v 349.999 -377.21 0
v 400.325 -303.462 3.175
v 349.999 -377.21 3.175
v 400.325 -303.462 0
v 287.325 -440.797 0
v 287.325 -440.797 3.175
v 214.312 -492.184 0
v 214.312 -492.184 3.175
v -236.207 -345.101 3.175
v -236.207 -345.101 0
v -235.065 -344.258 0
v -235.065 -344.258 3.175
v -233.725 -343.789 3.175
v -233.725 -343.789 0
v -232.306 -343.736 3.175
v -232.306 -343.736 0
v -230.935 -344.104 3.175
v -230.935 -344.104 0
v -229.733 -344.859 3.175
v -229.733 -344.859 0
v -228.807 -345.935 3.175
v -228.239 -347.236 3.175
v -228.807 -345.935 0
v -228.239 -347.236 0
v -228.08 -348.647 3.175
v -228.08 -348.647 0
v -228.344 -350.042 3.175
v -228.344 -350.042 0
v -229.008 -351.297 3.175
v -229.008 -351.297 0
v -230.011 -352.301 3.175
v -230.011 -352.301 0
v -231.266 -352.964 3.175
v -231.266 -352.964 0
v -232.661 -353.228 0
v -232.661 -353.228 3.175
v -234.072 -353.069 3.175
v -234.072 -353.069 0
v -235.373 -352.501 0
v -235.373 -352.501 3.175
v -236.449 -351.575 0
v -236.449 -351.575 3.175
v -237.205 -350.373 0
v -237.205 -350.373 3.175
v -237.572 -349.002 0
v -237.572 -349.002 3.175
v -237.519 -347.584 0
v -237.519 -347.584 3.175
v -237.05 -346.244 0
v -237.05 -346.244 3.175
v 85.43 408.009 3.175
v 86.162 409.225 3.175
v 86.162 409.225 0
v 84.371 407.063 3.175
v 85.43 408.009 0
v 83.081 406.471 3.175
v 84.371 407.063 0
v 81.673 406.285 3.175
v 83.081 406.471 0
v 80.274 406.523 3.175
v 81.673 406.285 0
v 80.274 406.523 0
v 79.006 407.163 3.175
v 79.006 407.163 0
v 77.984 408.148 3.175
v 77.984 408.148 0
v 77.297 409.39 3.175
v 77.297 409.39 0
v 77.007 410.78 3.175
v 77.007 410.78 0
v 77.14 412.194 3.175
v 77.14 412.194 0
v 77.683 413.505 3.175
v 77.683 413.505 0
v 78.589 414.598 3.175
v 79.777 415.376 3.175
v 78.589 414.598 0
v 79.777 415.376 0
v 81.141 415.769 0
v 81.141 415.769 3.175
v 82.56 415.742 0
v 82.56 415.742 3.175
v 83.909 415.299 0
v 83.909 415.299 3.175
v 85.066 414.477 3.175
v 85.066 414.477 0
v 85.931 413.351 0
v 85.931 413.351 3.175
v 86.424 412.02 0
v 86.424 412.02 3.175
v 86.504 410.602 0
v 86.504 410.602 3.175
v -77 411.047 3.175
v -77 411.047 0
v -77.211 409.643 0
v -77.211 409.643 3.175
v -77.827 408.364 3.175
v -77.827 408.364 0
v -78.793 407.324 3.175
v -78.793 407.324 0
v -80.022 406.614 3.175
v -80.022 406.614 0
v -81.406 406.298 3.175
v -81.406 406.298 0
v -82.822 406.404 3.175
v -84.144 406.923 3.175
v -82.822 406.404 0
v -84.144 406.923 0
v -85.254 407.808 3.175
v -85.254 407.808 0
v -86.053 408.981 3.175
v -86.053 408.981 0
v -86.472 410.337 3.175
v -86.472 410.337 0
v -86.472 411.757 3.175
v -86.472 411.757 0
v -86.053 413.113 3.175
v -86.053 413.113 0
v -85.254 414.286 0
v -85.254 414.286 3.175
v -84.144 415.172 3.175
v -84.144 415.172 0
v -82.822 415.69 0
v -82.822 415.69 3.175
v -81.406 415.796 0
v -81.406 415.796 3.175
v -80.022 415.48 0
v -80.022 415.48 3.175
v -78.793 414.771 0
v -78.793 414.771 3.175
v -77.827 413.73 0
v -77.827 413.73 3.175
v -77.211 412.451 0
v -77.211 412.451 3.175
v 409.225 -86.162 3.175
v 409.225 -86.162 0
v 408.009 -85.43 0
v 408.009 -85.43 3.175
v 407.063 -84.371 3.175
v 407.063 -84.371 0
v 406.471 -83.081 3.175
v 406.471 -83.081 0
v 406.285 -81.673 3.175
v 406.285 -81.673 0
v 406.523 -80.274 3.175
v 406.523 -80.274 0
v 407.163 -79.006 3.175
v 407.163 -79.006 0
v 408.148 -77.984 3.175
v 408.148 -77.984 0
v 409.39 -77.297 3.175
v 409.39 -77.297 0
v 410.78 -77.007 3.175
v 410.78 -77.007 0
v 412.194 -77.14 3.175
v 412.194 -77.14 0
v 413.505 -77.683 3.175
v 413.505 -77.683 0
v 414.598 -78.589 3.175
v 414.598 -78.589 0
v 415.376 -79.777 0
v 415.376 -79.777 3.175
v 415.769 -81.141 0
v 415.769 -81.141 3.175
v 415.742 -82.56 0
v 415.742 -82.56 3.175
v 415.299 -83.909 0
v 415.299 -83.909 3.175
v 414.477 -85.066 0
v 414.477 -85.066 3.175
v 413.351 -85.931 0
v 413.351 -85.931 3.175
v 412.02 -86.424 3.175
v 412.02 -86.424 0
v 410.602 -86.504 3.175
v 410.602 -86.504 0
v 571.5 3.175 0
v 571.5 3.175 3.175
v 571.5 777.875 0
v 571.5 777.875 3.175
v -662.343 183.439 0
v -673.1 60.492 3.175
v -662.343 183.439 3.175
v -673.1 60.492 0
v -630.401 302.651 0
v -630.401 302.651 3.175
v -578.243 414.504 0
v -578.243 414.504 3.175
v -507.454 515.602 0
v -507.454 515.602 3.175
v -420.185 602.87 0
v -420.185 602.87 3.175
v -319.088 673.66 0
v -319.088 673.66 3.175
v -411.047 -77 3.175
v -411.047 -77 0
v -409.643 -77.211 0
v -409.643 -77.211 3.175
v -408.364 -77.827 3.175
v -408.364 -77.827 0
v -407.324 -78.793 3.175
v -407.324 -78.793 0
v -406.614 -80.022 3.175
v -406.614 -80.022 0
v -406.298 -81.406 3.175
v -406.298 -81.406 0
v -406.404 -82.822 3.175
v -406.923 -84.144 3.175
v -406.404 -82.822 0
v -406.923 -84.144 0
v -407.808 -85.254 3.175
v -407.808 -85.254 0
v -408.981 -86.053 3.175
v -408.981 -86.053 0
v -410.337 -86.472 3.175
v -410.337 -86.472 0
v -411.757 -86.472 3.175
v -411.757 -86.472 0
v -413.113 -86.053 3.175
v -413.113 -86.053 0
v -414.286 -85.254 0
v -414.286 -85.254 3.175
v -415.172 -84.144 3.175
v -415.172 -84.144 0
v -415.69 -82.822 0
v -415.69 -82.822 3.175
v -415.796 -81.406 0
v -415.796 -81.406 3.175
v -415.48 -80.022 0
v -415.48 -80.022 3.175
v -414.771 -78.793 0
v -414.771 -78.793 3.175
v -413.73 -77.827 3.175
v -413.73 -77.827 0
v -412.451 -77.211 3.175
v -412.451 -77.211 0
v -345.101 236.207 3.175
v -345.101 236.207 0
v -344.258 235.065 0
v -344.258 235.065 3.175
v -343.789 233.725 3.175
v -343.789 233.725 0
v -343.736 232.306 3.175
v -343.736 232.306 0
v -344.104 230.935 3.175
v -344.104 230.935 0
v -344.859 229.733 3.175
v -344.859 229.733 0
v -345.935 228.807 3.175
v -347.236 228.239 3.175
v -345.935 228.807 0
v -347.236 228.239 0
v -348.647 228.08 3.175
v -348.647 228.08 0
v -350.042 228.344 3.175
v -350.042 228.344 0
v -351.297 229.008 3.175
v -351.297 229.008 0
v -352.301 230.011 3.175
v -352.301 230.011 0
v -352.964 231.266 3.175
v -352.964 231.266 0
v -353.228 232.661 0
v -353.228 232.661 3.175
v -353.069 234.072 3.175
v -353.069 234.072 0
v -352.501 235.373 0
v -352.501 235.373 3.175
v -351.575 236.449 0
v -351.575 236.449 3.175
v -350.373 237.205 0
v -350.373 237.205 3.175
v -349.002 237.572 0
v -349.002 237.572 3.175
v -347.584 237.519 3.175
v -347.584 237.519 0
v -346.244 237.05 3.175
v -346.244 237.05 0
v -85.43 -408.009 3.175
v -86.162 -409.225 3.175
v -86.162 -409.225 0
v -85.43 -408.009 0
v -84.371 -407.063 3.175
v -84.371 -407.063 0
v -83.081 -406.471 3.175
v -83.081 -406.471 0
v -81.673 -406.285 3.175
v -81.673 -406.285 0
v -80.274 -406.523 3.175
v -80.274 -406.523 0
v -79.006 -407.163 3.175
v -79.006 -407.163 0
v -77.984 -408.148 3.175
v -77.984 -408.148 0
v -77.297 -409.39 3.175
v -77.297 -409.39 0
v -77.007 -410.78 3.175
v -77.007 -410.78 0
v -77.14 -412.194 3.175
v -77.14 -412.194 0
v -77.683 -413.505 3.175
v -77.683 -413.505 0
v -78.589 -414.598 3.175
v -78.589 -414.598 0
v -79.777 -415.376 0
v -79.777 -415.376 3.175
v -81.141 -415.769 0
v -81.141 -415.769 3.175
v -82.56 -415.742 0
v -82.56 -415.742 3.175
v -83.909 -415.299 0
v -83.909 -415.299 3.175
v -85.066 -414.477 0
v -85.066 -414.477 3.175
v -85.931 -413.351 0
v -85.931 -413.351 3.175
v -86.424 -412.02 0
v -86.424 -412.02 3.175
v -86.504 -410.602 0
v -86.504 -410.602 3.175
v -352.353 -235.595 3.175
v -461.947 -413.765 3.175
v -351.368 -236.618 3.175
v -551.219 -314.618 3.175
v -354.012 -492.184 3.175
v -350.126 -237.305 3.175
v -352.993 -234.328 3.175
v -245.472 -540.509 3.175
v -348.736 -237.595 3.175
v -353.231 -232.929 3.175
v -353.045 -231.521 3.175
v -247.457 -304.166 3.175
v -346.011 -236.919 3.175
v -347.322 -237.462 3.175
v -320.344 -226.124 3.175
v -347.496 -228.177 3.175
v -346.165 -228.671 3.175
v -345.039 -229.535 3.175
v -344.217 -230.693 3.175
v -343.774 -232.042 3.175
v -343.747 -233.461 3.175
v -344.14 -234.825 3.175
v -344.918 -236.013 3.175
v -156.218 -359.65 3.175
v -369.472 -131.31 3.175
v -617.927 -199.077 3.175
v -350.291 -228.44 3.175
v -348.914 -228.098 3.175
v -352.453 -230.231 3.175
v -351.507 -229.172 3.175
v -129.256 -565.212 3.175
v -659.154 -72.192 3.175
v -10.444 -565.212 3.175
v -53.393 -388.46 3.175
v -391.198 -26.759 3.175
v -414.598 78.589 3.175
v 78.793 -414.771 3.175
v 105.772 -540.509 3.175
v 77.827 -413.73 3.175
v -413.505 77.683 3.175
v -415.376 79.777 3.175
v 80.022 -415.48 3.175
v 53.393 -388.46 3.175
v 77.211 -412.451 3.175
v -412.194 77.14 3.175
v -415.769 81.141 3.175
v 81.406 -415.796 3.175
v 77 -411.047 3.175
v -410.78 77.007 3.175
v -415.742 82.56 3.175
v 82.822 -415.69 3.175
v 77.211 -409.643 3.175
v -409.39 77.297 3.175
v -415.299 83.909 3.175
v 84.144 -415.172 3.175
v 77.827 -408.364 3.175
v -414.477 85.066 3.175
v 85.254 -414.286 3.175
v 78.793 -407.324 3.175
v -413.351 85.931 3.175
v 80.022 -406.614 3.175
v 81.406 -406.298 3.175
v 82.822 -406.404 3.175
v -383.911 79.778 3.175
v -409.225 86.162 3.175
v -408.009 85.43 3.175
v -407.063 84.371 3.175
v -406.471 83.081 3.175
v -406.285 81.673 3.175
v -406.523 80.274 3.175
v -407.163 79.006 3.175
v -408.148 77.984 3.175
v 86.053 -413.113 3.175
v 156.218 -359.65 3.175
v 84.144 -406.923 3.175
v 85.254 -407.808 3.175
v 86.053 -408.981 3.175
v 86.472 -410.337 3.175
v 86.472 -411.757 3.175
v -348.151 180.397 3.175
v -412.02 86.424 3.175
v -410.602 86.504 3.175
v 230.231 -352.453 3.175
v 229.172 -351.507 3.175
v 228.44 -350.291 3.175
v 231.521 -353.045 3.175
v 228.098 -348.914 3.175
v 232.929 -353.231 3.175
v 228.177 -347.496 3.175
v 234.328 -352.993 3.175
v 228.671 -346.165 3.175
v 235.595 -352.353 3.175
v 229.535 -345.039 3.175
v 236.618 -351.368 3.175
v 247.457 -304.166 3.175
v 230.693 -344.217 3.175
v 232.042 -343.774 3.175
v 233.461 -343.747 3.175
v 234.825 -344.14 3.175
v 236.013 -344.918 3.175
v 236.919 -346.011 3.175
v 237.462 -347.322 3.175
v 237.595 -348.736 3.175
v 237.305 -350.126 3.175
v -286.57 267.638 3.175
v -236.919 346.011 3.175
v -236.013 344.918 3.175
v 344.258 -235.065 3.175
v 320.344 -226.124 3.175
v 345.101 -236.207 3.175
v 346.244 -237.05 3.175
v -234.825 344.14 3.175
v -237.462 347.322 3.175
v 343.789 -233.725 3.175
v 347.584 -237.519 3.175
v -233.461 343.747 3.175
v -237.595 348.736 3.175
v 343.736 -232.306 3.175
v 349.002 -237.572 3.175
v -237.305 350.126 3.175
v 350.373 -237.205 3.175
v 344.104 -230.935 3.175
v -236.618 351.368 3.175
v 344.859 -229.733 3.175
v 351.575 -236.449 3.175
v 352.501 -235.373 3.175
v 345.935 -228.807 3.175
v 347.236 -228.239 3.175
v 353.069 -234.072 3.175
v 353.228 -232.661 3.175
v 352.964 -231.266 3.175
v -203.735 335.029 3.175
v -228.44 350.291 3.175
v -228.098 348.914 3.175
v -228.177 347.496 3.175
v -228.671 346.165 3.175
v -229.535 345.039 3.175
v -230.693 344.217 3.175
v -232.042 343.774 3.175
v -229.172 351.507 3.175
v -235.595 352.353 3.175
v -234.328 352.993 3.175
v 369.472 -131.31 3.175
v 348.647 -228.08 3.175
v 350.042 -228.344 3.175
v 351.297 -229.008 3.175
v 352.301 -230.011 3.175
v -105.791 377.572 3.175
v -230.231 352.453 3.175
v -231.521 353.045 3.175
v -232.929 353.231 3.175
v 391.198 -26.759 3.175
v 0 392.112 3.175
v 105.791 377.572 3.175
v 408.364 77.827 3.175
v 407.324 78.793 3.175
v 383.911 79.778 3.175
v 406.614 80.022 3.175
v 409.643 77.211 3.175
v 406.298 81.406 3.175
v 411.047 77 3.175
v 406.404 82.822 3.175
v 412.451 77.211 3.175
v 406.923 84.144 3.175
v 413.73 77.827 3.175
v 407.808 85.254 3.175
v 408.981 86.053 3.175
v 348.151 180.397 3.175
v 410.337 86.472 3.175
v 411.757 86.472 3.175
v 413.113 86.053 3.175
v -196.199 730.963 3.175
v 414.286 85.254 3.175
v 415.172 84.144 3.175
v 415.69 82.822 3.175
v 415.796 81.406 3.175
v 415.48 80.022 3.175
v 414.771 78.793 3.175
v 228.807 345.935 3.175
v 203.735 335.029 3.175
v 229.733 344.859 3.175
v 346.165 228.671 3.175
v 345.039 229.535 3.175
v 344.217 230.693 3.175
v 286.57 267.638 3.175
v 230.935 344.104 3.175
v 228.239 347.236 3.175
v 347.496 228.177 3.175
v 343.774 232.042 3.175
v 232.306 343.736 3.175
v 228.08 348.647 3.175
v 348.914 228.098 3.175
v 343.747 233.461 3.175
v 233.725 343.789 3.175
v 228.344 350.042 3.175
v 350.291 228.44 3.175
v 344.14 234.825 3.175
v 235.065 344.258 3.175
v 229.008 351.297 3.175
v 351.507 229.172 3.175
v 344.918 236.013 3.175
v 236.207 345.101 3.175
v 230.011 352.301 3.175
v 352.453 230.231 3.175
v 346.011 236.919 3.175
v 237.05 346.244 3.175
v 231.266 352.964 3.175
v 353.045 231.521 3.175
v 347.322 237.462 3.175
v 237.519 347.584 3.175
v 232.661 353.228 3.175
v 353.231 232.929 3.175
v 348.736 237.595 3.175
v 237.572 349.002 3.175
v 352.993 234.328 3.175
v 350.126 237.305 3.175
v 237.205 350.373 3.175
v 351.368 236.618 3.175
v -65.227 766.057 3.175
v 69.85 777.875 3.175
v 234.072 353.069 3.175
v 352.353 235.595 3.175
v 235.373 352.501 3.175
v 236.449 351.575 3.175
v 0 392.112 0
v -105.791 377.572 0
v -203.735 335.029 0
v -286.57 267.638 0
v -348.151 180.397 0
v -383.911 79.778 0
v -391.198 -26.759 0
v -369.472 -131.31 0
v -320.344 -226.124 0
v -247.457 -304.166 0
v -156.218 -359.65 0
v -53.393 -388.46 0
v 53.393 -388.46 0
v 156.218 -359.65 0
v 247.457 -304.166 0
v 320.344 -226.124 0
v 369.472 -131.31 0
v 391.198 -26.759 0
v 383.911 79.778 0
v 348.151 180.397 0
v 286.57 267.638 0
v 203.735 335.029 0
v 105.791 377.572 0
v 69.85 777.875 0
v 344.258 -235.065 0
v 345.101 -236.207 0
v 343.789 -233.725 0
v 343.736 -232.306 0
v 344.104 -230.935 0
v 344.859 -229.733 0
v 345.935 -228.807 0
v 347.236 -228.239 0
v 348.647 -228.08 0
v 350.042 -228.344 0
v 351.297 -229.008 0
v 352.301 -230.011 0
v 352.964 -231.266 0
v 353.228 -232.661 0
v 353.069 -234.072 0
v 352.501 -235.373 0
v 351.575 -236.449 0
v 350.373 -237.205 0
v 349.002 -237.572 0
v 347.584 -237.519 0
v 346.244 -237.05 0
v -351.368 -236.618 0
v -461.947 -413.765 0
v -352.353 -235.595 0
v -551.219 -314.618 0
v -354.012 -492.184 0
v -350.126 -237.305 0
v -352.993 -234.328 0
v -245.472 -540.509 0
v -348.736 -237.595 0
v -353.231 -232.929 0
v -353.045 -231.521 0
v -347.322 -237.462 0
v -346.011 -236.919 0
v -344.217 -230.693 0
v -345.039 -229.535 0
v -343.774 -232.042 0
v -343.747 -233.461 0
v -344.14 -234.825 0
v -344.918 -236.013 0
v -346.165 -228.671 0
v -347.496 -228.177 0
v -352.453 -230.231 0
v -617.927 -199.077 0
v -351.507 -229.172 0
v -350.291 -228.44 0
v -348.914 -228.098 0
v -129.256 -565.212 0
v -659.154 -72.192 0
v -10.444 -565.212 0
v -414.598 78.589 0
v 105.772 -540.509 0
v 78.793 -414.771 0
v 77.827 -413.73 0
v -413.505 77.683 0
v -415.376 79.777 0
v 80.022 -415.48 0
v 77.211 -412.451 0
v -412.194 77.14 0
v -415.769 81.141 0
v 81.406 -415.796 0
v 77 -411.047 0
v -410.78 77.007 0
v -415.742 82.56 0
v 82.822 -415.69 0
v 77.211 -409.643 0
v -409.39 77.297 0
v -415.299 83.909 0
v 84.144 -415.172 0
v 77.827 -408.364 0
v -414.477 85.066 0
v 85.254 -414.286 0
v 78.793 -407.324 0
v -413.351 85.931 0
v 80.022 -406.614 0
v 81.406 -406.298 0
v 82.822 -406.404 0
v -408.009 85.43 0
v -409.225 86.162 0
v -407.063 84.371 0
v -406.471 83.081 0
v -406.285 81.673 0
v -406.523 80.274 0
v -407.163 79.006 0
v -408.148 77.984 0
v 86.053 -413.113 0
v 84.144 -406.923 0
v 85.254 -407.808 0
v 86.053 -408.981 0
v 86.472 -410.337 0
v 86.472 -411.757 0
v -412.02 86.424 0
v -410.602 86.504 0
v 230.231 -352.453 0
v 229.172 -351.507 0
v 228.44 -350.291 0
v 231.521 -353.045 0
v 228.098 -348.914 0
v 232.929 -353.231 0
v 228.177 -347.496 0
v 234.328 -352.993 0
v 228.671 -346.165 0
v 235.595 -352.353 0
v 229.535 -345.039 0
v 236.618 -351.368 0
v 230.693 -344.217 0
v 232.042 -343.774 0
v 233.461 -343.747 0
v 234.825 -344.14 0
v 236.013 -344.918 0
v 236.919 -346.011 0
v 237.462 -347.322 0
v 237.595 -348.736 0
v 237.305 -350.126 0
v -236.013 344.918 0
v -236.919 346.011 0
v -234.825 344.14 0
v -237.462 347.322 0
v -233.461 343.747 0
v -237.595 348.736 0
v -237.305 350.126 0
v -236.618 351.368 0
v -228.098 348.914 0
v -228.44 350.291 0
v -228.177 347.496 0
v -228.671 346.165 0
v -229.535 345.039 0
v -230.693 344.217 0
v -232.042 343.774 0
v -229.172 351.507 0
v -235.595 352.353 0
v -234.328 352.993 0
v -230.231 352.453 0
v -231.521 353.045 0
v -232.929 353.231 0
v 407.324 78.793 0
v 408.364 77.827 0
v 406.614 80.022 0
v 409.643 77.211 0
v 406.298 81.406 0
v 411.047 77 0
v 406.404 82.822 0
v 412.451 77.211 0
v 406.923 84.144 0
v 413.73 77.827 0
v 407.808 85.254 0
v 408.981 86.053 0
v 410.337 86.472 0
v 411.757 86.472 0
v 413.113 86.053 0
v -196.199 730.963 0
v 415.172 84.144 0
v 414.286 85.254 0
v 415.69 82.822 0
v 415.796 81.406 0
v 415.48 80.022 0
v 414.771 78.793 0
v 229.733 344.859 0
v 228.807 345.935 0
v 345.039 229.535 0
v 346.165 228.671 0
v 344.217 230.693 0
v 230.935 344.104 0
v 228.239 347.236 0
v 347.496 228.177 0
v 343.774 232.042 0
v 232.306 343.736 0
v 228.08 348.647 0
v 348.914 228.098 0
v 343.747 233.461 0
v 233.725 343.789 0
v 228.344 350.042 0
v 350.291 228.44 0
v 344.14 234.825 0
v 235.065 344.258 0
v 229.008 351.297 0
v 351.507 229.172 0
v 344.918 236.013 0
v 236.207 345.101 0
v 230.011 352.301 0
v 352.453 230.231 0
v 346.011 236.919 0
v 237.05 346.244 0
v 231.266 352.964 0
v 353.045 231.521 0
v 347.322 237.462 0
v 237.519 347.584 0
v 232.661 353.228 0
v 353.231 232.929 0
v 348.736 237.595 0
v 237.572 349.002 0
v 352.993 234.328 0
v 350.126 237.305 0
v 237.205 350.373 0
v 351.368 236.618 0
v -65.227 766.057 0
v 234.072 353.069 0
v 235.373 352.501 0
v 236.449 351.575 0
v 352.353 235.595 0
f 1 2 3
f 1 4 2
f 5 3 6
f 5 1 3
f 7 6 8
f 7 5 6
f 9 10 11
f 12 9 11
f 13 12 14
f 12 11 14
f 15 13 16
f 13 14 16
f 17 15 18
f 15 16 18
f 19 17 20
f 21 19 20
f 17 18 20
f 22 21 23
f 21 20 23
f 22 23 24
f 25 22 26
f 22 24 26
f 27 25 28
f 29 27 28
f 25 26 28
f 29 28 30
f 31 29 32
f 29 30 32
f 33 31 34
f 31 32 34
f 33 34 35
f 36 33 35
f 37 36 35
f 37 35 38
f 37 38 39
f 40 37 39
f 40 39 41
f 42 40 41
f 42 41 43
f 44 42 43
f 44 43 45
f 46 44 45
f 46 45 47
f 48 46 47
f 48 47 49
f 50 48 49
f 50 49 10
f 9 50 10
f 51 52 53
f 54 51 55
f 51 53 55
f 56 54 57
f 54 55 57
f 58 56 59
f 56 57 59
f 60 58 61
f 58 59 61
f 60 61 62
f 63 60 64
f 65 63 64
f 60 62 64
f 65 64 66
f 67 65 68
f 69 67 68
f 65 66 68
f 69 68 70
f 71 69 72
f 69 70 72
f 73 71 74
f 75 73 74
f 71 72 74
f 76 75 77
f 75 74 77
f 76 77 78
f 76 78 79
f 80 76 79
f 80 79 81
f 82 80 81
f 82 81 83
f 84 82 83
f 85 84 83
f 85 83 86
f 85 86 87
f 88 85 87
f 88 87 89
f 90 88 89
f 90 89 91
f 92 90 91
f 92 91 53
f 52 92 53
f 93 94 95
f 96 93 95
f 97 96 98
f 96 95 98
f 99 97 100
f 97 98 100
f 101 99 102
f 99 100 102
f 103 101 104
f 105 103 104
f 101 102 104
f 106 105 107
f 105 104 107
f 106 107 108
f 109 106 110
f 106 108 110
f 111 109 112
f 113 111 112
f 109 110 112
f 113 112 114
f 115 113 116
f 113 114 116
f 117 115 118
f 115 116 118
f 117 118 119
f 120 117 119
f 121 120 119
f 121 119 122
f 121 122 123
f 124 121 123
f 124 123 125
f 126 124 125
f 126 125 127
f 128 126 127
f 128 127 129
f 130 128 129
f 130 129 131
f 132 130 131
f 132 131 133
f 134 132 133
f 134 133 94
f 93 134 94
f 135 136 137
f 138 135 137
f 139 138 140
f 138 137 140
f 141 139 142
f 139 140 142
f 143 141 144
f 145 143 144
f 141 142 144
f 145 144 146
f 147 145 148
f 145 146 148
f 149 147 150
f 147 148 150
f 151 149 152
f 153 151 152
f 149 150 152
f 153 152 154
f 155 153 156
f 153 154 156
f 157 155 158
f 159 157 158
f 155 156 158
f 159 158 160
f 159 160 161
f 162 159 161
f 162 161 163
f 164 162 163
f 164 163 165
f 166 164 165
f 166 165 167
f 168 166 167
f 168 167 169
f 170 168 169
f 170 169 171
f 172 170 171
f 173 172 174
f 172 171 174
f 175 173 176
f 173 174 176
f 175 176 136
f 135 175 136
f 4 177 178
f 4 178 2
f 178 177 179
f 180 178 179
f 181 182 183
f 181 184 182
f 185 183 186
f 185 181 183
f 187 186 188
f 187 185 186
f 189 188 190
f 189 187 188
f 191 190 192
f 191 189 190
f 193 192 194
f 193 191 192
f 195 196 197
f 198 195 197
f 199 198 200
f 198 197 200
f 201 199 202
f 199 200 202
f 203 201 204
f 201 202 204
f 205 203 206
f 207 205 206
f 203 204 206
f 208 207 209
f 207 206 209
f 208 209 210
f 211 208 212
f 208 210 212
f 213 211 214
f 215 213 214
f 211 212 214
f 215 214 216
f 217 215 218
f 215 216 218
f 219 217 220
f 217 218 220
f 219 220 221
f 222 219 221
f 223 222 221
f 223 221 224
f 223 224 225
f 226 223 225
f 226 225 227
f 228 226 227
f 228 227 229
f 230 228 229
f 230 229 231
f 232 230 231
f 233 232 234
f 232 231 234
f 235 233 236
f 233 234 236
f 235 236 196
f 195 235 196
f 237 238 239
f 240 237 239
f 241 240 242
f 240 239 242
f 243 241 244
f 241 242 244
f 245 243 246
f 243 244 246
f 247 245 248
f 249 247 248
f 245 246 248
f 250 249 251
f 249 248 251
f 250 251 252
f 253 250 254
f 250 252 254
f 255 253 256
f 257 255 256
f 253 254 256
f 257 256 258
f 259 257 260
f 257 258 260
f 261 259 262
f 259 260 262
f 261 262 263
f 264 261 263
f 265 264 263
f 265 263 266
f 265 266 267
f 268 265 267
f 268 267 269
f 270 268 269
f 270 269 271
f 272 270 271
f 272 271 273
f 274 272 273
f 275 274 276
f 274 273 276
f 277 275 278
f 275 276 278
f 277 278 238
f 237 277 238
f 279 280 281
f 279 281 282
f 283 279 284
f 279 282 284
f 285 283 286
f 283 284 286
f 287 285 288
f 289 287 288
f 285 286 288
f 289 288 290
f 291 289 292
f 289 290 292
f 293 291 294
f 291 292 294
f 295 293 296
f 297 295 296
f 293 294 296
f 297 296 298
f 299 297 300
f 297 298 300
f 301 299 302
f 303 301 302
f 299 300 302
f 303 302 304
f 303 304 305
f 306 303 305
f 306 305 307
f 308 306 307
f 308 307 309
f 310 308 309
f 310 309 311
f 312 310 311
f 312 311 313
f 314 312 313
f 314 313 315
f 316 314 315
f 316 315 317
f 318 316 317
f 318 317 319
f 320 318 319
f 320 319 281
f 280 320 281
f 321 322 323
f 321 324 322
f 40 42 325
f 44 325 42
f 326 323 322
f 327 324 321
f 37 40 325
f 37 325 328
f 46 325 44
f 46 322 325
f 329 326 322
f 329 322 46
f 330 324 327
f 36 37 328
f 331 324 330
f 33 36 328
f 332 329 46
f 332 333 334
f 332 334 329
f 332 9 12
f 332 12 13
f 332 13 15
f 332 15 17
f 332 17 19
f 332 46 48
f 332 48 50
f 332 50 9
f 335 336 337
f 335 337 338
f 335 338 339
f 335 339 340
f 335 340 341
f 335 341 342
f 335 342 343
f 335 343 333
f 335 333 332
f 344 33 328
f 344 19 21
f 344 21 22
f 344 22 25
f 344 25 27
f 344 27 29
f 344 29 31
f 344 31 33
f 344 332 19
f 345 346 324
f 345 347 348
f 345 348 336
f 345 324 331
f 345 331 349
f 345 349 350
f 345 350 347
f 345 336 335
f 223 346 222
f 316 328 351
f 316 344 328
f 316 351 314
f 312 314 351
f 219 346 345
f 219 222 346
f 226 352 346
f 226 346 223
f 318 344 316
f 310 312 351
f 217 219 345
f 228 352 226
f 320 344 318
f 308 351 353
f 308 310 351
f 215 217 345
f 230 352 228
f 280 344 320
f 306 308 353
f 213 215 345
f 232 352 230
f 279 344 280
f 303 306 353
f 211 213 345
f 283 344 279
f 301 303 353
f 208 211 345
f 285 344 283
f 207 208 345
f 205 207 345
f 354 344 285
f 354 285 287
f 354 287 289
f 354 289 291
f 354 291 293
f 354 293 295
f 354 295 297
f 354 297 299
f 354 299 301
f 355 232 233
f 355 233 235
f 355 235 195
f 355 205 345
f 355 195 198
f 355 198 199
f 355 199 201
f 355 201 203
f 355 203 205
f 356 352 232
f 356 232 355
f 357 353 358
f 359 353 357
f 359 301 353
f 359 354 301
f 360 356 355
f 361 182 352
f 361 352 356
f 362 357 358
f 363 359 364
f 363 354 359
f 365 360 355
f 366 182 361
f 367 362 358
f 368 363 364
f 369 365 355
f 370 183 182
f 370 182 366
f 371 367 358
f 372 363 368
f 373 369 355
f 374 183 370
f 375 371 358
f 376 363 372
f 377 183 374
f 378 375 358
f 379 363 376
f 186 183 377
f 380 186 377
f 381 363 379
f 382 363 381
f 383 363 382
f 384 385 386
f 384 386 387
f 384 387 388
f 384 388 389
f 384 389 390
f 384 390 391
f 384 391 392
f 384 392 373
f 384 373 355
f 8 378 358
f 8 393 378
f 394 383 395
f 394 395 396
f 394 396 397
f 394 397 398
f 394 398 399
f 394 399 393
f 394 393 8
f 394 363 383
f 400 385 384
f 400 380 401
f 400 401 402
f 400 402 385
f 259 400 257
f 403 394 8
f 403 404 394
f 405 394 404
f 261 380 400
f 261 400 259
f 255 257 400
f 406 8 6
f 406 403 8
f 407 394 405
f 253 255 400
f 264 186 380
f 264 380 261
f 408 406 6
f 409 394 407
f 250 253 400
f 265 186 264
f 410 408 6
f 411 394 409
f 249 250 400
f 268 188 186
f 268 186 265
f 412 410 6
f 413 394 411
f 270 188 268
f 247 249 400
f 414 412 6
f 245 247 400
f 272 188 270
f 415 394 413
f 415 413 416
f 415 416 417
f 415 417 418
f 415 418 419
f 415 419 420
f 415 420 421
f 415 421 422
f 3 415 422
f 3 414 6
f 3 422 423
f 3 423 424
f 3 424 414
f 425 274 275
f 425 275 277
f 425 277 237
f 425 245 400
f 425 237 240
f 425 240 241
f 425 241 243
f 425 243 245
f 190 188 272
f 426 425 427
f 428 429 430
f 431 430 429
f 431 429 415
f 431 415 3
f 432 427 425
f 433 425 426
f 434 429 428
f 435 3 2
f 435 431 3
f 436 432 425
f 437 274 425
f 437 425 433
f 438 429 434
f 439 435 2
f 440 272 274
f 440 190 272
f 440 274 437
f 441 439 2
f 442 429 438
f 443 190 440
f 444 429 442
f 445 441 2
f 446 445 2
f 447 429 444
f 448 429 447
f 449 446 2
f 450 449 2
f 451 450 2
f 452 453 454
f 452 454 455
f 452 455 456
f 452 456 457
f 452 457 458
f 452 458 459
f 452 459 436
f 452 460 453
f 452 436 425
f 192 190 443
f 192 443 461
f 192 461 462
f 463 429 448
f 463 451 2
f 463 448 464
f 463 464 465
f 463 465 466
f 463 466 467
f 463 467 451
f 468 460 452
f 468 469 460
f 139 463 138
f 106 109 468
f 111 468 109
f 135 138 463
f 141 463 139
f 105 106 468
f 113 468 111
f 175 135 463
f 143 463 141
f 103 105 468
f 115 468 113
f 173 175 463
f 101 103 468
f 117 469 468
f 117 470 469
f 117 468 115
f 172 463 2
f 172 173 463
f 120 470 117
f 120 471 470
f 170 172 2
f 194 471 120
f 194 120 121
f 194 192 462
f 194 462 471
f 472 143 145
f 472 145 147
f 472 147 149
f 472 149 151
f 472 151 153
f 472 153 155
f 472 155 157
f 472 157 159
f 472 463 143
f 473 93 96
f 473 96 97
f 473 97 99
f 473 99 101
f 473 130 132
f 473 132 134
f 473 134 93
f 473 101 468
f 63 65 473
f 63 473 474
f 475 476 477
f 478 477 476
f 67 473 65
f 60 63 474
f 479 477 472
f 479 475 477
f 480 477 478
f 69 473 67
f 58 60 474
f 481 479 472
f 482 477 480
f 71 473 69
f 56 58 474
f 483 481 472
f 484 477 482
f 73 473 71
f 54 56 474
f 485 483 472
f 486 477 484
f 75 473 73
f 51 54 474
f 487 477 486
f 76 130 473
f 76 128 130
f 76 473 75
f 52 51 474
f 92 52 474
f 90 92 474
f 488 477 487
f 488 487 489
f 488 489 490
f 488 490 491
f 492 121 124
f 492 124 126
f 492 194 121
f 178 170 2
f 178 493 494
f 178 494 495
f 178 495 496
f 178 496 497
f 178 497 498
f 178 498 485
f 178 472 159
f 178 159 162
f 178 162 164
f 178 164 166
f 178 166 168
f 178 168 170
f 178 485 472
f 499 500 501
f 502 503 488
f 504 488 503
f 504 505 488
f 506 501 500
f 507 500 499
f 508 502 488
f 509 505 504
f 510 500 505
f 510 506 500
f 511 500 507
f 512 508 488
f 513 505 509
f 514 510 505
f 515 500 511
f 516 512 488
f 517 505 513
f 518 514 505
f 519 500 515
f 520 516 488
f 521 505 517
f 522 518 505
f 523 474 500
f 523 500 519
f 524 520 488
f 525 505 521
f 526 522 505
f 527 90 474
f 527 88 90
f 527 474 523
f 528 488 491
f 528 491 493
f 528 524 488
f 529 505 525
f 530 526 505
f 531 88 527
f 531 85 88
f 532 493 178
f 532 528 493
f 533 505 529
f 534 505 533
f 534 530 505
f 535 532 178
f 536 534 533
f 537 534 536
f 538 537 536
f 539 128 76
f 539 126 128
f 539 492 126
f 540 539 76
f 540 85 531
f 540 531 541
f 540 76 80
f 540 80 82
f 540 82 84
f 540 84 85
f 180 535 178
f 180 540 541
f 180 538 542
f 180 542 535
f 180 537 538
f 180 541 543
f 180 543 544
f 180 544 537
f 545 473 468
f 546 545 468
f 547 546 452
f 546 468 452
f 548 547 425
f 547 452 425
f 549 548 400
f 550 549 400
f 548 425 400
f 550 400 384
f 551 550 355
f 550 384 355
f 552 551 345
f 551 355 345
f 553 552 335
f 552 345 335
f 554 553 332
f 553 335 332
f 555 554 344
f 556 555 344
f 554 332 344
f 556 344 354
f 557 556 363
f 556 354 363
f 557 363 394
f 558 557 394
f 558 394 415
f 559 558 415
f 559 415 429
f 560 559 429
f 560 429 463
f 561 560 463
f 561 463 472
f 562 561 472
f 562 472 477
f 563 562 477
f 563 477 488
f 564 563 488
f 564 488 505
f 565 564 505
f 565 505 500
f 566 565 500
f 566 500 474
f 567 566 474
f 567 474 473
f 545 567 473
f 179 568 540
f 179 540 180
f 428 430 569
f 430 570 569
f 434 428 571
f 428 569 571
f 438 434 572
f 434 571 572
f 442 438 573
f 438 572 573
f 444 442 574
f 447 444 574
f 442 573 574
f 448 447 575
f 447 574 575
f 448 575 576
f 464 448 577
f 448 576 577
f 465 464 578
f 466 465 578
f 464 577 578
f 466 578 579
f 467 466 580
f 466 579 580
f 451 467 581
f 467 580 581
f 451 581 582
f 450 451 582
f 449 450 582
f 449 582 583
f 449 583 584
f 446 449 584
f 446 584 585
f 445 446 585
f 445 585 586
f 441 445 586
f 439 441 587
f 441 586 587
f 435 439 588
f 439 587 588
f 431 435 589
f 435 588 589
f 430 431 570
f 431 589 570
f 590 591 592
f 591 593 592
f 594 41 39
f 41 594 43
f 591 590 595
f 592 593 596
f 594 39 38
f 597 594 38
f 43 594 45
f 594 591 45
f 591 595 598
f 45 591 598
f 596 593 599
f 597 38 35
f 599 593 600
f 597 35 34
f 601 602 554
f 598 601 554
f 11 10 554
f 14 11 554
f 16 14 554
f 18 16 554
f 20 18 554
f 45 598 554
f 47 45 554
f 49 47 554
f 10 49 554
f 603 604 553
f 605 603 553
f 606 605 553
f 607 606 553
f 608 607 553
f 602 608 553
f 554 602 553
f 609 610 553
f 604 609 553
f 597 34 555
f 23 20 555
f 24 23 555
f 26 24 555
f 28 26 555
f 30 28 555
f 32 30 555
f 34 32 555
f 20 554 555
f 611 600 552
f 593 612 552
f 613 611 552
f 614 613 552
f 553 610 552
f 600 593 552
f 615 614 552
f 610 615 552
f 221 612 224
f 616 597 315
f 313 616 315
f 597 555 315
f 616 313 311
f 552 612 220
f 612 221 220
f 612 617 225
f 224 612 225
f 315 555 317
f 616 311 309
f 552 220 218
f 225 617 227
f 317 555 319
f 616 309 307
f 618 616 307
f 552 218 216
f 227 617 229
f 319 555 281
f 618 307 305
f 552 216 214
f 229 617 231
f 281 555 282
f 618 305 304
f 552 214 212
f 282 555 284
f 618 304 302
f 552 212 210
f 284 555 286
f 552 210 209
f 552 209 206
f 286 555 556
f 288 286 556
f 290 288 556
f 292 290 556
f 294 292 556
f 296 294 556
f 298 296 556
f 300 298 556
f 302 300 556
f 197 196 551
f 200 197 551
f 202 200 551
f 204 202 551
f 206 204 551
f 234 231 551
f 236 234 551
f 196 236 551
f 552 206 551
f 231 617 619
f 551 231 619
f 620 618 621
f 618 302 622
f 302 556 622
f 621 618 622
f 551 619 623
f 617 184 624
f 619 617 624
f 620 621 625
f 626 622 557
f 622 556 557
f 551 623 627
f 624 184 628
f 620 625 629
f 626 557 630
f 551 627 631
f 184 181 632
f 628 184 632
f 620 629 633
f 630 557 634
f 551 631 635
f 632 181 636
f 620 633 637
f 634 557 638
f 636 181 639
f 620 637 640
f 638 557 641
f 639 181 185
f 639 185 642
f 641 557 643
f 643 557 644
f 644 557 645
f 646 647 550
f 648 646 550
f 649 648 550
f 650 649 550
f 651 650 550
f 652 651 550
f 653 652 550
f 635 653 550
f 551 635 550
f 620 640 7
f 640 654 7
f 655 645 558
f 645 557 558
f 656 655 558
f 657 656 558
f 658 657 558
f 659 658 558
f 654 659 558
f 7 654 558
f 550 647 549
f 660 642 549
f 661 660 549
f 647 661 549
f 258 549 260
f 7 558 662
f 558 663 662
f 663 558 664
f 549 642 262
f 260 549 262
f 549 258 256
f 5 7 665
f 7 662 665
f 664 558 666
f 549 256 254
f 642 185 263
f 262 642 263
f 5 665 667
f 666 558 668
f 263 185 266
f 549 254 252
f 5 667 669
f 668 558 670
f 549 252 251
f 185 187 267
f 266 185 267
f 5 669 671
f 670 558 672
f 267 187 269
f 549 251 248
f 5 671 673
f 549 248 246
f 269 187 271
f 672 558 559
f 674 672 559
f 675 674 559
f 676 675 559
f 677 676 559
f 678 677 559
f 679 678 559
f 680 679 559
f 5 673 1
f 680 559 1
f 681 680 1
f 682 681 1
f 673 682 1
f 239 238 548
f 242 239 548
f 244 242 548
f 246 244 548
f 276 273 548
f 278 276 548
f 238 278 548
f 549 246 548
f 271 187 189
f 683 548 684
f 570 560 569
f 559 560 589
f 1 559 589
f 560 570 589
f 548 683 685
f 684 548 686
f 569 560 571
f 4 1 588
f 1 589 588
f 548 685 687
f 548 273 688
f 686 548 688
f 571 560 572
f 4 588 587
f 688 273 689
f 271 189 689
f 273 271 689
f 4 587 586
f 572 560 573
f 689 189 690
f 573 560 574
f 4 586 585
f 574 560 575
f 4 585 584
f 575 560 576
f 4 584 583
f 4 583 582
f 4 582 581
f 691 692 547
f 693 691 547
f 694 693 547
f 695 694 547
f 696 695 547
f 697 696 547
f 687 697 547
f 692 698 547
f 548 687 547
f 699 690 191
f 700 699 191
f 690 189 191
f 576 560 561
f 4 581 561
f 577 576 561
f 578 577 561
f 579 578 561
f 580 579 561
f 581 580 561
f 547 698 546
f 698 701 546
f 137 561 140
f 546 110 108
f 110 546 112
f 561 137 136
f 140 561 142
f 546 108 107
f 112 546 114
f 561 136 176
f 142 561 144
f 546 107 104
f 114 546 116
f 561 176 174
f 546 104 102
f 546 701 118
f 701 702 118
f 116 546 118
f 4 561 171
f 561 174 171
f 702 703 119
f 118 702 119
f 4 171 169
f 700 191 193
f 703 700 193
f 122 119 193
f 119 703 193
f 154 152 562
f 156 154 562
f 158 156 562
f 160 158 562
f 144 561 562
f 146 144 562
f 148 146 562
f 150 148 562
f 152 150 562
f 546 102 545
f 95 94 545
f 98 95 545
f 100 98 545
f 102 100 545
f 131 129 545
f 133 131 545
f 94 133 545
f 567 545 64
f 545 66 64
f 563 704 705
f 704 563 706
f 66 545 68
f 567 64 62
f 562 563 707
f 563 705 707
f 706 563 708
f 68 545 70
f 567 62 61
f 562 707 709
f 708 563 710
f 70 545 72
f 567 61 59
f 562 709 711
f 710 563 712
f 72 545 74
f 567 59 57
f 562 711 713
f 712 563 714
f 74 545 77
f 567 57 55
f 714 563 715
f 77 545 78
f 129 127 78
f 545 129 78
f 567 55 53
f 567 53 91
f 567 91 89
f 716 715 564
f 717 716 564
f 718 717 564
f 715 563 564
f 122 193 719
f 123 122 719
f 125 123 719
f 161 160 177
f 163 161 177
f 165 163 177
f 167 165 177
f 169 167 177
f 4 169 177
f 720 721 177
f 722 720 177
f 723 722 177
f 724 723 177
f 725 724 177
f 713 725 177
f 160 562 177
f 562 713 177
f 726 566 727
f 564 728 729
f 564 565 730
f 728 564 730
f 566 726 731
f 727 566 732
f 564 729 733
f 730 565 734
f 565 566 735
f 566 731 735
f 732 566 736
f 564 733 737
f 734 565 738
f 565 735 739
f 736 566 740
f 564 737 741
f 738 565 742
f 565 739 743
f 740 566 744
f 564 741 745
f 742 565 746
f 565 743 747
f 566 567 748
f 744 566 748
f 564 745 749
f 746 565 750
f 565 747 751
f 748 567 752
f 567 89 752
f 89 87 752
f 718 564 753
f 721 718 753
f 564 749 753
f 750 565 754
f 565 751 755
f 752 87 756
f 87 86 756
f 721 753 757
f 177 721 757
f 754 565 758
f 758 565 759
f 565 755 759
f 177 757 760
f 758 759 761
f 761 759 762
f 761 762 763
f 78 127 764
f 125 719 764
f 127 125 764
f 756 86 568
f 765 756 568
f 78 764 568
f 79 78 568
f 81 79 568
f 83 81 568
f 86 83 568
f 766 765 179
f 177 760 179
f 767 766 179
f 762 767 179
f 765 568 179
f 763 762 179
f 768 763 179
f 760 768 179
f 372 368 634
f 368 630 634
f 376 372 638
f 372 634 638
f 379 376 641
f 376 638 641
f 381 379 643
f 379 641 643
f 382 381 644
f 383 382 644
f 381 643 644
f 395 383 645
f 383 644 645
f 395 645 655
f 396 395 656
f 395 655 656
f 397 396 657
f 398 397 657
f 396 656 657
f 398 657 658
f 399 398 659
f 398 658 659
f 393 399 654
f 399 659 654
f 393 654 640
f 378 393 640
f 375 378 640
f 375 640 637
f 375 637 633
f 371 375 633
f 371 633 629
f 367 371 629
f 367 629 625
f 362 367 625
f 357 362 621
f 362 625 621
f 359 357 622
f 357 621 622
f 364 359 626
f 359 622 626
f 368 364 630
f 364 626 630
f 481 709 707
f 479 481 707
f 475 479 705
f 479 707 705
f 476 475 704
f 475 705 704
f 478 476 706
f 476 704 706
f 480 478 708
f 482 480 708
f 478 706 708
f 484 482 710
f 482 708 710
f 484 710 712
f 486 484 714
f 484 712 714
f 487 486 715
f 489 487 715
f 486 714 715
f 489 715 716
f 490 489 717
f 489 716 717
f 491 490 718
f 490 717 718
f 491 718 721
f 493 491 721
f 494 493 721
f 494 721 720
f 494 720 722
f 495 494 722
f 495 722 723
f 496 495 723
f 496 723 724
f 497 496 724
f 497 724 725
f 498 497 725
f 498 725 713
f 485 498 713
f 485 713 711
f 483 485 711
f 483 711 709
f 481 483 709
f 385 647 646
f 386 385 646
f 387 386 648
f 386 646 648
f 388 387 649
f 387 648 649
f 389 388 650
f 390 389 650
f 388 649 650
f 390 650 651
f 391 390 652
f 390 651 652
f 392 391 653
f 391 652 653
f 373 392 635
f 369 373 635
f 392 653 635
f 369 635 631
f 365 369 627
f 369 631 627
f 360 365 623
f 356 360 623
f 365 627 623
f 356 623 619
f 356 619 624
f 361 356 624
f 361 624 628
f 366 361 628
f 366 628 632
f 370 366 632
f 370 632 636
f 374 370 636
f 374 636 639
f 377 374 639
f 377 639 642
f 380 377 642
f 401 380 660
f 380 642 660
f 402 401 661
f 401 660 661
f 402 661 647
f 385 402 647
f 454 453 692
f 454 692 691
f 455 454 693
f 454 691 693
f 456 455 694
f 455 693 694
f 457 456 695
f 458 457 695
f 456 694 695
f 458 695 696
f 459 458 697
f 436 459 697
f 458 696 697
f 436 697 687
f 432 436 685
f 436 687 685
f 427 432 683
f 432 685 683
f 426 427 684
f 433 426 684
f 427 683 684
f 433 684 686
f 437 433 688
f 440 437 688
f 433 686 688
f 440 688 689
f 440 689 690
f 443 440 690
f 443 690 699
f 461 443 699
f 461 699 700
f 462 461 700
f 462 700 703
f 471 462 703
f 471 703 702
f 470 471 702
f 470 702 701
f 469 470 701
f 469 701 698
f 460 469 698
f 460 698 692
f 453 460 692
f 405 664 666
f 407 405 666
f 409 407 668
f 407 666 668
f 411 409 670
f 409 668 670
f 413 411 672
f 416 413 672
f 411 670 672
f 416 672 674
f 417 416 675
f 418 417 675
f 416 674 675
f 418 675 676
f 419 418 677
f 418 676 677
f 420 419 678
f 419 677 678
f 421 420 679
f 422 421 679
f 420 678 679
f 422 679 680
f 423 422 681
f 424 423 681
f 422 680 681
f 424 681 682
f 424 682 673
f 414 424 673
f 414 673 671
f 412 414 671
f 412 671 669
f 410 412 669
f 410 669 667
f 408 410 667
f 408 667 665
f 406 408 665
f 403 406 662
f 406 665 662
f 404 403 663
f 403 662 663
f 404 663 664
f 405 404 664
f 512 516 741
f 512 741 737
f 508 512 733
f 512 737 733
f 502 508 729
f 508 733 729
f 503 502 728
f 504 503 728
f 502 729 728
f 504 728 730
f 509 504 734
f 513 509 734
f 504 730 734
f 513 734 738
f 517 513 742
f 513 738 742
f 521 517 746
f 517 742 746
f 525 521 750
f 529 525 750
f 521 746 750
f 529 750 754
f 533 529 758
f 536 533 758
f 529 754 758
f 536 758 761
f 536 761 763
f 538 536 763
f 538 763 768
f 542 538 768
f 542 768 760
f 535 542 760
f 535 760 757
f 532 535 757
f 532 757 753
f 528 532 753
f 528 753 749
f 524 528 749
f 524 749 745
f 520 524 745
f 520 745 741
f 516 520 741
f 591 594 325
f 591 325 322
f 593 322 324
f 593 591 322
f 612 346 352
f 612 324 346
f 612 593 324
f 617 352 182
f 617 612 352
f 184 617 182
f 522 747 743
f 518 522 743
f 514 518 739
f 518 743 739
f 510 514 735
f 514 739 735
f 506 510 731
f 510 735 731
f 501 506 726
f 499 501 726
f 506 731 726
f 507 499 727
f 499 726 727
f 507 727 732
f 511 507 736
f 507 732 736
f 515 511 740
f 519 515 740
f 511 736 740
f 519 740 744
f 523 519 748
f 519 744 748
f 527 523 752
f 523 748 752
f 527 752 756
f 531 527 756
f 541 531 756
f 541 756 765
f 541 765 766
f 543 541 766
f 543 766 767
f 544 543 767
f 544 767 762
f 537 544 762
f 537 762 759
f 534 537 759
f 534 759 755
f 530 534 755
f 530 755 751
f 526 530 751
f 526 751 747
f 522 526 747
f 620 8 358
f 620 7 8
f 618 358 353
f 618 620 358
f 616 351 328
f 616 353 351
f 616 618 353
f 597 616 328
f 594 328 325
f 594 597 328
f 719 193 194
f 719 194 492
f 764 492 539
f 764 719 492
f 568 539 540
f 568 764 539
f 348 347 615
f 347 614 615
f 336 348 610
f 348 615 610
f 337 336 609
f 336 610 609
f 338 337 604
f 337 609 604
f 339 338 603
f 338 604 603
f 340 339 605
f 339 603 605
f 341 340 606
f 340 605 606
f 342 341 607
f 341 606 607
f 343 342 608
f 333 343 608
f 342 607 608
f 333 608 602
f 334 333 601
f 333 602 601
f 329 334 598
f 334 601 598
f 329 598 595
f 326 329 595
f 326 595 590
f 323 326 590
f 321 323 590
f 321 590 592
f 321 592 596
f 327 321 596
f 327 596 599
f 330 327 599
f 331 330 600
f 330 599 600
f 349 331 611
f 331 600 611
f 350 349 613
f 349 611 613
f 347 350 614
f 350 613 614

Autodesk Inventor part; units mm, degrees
ref_plane "YZ Plane" through (0, 0, 0) normal (1, 0, 0) x (0, 1, 0)
ref_plane "XZ Plane" through (0, 0, 0) normal (0, 1, 0) x (-1, 0, 0)
ref_plane "XY Plane" through (0, 0, 0) normal (0, 0, 1) x (1, 0, 0)
sketch "Sketch1" plane through (0, 0, 0) normal (0, 0, 1) x (1, 0, 0)
  circle A0 centre (0, 0) radius 69.85 construction
  line L0 (69.85, 0) -> (34.925, -60.4919) construction
  line L1 (34.925, -60.4919) -> (-34.925, -60.4919) construction
  line L2 (-34.925, -60.4919) -> (-69.85, 0) construction
  line L3 (-69.85, 0) -> (-34.925, 60.4919) construction
  line L4 (-34.925, 60.4919) -> (34.925, 60.4919) construction
  line L5 (34.925, 60.4919) -> (69.85, 0) construction
  line L6 (69.85, 0) -> (69.85, 777.875) construction
  line L7 (0, 60.4919) -> (0, -60.4919) construction
  line L8 (-69.85, 0) -> (69.85, 0) construction
  arc A1 (69.85, 777.875) -> (-319.0875, 673.6595) centre (69.85, 0) ccw
  arc A2 (-319.0875, 673.6595) -> (-673.1, 60.4919) centre (34.925, 60.4919) ccw
  arc A3 (-673.1, 60.4919) -> (-354.0125, -492.1839) centre (-34.925, 60.4919) ccw
  arc A4 (-354.0125, -492.1839) -> (214.3125, -492.1839) centre (-69.85, 0) ccw
  arc A5 (214.3125, -492.1839) -> (463.55, -60.4919) centre (-34.925, -60.4919) ccw
  arc A6 (463.55, -60.4919) -> (458.7952, 3.175) centre (34.925, -60.4919) ccw
  line L9 (458.7952, 3.175) -> (571.5, 3.175)
  line L10 (571.5, 3.175) -> (571.5, 777.875)
  line L11 (69.85, 777.875) -> (571.5, 777.875)
  line L12 (571.5, 3.175) -> (400.325, -303.4625)
  dimension "d0" = 777.875
  dimension "d1" = 139.7
  dimension "d2" = 571.5
  dimension "d3" = 774.7
  dimension "d5" = 498.475
extrude "Extrusion1" add sketch "Sketch1" along normal blind 3.175
hole "Hole1" at (0, 0, 0) direction (0, 0, 1) diameter 784.225 end through all
ref_plane "Work Plane1" through (0, 0, 1833.3831) normal (-1, 0, 0) x (0, 0, 1)
ref_plane "Work Plane2" through (0, 0, 1833.3831) normal (0, -1, 0) x (0, 0, 1)
ref_plane "Work Plane3" through (0, 0, 1833.3831) normal (0.7071, -0.7071, 0) x (0, 0, 1)
ref_plane "Work Plane4" through (0, 0, 1833.3831) normal (-0.7071, -0.7071, 0) x (0, 0, 1)
sketch "Sketch2" plane through (0, 0, 3.175) normal (0, 0, 1) x (1, 0, 0)
  circle A0 centre (0, 0) radius 392.1125 projected
  point P0 (411.0471, 81.7624)
  dimension "d19" = 419.1
  dimension "d20" = 81.7623
hole "Hole2" at (411.0471, 81.7624, 3.175) direction (0, 0, -1) diameter 9.525 end through all
pattern_circular "Circular Pattern1" count 16 over 360 about axis through (0, 0, 1833.3831) along (0, 0, 1) of "Hole2"
equation "\"d20\" = 0.19509 * d19"
properties part number "inlet side sheet" material "Steel, Mild"
